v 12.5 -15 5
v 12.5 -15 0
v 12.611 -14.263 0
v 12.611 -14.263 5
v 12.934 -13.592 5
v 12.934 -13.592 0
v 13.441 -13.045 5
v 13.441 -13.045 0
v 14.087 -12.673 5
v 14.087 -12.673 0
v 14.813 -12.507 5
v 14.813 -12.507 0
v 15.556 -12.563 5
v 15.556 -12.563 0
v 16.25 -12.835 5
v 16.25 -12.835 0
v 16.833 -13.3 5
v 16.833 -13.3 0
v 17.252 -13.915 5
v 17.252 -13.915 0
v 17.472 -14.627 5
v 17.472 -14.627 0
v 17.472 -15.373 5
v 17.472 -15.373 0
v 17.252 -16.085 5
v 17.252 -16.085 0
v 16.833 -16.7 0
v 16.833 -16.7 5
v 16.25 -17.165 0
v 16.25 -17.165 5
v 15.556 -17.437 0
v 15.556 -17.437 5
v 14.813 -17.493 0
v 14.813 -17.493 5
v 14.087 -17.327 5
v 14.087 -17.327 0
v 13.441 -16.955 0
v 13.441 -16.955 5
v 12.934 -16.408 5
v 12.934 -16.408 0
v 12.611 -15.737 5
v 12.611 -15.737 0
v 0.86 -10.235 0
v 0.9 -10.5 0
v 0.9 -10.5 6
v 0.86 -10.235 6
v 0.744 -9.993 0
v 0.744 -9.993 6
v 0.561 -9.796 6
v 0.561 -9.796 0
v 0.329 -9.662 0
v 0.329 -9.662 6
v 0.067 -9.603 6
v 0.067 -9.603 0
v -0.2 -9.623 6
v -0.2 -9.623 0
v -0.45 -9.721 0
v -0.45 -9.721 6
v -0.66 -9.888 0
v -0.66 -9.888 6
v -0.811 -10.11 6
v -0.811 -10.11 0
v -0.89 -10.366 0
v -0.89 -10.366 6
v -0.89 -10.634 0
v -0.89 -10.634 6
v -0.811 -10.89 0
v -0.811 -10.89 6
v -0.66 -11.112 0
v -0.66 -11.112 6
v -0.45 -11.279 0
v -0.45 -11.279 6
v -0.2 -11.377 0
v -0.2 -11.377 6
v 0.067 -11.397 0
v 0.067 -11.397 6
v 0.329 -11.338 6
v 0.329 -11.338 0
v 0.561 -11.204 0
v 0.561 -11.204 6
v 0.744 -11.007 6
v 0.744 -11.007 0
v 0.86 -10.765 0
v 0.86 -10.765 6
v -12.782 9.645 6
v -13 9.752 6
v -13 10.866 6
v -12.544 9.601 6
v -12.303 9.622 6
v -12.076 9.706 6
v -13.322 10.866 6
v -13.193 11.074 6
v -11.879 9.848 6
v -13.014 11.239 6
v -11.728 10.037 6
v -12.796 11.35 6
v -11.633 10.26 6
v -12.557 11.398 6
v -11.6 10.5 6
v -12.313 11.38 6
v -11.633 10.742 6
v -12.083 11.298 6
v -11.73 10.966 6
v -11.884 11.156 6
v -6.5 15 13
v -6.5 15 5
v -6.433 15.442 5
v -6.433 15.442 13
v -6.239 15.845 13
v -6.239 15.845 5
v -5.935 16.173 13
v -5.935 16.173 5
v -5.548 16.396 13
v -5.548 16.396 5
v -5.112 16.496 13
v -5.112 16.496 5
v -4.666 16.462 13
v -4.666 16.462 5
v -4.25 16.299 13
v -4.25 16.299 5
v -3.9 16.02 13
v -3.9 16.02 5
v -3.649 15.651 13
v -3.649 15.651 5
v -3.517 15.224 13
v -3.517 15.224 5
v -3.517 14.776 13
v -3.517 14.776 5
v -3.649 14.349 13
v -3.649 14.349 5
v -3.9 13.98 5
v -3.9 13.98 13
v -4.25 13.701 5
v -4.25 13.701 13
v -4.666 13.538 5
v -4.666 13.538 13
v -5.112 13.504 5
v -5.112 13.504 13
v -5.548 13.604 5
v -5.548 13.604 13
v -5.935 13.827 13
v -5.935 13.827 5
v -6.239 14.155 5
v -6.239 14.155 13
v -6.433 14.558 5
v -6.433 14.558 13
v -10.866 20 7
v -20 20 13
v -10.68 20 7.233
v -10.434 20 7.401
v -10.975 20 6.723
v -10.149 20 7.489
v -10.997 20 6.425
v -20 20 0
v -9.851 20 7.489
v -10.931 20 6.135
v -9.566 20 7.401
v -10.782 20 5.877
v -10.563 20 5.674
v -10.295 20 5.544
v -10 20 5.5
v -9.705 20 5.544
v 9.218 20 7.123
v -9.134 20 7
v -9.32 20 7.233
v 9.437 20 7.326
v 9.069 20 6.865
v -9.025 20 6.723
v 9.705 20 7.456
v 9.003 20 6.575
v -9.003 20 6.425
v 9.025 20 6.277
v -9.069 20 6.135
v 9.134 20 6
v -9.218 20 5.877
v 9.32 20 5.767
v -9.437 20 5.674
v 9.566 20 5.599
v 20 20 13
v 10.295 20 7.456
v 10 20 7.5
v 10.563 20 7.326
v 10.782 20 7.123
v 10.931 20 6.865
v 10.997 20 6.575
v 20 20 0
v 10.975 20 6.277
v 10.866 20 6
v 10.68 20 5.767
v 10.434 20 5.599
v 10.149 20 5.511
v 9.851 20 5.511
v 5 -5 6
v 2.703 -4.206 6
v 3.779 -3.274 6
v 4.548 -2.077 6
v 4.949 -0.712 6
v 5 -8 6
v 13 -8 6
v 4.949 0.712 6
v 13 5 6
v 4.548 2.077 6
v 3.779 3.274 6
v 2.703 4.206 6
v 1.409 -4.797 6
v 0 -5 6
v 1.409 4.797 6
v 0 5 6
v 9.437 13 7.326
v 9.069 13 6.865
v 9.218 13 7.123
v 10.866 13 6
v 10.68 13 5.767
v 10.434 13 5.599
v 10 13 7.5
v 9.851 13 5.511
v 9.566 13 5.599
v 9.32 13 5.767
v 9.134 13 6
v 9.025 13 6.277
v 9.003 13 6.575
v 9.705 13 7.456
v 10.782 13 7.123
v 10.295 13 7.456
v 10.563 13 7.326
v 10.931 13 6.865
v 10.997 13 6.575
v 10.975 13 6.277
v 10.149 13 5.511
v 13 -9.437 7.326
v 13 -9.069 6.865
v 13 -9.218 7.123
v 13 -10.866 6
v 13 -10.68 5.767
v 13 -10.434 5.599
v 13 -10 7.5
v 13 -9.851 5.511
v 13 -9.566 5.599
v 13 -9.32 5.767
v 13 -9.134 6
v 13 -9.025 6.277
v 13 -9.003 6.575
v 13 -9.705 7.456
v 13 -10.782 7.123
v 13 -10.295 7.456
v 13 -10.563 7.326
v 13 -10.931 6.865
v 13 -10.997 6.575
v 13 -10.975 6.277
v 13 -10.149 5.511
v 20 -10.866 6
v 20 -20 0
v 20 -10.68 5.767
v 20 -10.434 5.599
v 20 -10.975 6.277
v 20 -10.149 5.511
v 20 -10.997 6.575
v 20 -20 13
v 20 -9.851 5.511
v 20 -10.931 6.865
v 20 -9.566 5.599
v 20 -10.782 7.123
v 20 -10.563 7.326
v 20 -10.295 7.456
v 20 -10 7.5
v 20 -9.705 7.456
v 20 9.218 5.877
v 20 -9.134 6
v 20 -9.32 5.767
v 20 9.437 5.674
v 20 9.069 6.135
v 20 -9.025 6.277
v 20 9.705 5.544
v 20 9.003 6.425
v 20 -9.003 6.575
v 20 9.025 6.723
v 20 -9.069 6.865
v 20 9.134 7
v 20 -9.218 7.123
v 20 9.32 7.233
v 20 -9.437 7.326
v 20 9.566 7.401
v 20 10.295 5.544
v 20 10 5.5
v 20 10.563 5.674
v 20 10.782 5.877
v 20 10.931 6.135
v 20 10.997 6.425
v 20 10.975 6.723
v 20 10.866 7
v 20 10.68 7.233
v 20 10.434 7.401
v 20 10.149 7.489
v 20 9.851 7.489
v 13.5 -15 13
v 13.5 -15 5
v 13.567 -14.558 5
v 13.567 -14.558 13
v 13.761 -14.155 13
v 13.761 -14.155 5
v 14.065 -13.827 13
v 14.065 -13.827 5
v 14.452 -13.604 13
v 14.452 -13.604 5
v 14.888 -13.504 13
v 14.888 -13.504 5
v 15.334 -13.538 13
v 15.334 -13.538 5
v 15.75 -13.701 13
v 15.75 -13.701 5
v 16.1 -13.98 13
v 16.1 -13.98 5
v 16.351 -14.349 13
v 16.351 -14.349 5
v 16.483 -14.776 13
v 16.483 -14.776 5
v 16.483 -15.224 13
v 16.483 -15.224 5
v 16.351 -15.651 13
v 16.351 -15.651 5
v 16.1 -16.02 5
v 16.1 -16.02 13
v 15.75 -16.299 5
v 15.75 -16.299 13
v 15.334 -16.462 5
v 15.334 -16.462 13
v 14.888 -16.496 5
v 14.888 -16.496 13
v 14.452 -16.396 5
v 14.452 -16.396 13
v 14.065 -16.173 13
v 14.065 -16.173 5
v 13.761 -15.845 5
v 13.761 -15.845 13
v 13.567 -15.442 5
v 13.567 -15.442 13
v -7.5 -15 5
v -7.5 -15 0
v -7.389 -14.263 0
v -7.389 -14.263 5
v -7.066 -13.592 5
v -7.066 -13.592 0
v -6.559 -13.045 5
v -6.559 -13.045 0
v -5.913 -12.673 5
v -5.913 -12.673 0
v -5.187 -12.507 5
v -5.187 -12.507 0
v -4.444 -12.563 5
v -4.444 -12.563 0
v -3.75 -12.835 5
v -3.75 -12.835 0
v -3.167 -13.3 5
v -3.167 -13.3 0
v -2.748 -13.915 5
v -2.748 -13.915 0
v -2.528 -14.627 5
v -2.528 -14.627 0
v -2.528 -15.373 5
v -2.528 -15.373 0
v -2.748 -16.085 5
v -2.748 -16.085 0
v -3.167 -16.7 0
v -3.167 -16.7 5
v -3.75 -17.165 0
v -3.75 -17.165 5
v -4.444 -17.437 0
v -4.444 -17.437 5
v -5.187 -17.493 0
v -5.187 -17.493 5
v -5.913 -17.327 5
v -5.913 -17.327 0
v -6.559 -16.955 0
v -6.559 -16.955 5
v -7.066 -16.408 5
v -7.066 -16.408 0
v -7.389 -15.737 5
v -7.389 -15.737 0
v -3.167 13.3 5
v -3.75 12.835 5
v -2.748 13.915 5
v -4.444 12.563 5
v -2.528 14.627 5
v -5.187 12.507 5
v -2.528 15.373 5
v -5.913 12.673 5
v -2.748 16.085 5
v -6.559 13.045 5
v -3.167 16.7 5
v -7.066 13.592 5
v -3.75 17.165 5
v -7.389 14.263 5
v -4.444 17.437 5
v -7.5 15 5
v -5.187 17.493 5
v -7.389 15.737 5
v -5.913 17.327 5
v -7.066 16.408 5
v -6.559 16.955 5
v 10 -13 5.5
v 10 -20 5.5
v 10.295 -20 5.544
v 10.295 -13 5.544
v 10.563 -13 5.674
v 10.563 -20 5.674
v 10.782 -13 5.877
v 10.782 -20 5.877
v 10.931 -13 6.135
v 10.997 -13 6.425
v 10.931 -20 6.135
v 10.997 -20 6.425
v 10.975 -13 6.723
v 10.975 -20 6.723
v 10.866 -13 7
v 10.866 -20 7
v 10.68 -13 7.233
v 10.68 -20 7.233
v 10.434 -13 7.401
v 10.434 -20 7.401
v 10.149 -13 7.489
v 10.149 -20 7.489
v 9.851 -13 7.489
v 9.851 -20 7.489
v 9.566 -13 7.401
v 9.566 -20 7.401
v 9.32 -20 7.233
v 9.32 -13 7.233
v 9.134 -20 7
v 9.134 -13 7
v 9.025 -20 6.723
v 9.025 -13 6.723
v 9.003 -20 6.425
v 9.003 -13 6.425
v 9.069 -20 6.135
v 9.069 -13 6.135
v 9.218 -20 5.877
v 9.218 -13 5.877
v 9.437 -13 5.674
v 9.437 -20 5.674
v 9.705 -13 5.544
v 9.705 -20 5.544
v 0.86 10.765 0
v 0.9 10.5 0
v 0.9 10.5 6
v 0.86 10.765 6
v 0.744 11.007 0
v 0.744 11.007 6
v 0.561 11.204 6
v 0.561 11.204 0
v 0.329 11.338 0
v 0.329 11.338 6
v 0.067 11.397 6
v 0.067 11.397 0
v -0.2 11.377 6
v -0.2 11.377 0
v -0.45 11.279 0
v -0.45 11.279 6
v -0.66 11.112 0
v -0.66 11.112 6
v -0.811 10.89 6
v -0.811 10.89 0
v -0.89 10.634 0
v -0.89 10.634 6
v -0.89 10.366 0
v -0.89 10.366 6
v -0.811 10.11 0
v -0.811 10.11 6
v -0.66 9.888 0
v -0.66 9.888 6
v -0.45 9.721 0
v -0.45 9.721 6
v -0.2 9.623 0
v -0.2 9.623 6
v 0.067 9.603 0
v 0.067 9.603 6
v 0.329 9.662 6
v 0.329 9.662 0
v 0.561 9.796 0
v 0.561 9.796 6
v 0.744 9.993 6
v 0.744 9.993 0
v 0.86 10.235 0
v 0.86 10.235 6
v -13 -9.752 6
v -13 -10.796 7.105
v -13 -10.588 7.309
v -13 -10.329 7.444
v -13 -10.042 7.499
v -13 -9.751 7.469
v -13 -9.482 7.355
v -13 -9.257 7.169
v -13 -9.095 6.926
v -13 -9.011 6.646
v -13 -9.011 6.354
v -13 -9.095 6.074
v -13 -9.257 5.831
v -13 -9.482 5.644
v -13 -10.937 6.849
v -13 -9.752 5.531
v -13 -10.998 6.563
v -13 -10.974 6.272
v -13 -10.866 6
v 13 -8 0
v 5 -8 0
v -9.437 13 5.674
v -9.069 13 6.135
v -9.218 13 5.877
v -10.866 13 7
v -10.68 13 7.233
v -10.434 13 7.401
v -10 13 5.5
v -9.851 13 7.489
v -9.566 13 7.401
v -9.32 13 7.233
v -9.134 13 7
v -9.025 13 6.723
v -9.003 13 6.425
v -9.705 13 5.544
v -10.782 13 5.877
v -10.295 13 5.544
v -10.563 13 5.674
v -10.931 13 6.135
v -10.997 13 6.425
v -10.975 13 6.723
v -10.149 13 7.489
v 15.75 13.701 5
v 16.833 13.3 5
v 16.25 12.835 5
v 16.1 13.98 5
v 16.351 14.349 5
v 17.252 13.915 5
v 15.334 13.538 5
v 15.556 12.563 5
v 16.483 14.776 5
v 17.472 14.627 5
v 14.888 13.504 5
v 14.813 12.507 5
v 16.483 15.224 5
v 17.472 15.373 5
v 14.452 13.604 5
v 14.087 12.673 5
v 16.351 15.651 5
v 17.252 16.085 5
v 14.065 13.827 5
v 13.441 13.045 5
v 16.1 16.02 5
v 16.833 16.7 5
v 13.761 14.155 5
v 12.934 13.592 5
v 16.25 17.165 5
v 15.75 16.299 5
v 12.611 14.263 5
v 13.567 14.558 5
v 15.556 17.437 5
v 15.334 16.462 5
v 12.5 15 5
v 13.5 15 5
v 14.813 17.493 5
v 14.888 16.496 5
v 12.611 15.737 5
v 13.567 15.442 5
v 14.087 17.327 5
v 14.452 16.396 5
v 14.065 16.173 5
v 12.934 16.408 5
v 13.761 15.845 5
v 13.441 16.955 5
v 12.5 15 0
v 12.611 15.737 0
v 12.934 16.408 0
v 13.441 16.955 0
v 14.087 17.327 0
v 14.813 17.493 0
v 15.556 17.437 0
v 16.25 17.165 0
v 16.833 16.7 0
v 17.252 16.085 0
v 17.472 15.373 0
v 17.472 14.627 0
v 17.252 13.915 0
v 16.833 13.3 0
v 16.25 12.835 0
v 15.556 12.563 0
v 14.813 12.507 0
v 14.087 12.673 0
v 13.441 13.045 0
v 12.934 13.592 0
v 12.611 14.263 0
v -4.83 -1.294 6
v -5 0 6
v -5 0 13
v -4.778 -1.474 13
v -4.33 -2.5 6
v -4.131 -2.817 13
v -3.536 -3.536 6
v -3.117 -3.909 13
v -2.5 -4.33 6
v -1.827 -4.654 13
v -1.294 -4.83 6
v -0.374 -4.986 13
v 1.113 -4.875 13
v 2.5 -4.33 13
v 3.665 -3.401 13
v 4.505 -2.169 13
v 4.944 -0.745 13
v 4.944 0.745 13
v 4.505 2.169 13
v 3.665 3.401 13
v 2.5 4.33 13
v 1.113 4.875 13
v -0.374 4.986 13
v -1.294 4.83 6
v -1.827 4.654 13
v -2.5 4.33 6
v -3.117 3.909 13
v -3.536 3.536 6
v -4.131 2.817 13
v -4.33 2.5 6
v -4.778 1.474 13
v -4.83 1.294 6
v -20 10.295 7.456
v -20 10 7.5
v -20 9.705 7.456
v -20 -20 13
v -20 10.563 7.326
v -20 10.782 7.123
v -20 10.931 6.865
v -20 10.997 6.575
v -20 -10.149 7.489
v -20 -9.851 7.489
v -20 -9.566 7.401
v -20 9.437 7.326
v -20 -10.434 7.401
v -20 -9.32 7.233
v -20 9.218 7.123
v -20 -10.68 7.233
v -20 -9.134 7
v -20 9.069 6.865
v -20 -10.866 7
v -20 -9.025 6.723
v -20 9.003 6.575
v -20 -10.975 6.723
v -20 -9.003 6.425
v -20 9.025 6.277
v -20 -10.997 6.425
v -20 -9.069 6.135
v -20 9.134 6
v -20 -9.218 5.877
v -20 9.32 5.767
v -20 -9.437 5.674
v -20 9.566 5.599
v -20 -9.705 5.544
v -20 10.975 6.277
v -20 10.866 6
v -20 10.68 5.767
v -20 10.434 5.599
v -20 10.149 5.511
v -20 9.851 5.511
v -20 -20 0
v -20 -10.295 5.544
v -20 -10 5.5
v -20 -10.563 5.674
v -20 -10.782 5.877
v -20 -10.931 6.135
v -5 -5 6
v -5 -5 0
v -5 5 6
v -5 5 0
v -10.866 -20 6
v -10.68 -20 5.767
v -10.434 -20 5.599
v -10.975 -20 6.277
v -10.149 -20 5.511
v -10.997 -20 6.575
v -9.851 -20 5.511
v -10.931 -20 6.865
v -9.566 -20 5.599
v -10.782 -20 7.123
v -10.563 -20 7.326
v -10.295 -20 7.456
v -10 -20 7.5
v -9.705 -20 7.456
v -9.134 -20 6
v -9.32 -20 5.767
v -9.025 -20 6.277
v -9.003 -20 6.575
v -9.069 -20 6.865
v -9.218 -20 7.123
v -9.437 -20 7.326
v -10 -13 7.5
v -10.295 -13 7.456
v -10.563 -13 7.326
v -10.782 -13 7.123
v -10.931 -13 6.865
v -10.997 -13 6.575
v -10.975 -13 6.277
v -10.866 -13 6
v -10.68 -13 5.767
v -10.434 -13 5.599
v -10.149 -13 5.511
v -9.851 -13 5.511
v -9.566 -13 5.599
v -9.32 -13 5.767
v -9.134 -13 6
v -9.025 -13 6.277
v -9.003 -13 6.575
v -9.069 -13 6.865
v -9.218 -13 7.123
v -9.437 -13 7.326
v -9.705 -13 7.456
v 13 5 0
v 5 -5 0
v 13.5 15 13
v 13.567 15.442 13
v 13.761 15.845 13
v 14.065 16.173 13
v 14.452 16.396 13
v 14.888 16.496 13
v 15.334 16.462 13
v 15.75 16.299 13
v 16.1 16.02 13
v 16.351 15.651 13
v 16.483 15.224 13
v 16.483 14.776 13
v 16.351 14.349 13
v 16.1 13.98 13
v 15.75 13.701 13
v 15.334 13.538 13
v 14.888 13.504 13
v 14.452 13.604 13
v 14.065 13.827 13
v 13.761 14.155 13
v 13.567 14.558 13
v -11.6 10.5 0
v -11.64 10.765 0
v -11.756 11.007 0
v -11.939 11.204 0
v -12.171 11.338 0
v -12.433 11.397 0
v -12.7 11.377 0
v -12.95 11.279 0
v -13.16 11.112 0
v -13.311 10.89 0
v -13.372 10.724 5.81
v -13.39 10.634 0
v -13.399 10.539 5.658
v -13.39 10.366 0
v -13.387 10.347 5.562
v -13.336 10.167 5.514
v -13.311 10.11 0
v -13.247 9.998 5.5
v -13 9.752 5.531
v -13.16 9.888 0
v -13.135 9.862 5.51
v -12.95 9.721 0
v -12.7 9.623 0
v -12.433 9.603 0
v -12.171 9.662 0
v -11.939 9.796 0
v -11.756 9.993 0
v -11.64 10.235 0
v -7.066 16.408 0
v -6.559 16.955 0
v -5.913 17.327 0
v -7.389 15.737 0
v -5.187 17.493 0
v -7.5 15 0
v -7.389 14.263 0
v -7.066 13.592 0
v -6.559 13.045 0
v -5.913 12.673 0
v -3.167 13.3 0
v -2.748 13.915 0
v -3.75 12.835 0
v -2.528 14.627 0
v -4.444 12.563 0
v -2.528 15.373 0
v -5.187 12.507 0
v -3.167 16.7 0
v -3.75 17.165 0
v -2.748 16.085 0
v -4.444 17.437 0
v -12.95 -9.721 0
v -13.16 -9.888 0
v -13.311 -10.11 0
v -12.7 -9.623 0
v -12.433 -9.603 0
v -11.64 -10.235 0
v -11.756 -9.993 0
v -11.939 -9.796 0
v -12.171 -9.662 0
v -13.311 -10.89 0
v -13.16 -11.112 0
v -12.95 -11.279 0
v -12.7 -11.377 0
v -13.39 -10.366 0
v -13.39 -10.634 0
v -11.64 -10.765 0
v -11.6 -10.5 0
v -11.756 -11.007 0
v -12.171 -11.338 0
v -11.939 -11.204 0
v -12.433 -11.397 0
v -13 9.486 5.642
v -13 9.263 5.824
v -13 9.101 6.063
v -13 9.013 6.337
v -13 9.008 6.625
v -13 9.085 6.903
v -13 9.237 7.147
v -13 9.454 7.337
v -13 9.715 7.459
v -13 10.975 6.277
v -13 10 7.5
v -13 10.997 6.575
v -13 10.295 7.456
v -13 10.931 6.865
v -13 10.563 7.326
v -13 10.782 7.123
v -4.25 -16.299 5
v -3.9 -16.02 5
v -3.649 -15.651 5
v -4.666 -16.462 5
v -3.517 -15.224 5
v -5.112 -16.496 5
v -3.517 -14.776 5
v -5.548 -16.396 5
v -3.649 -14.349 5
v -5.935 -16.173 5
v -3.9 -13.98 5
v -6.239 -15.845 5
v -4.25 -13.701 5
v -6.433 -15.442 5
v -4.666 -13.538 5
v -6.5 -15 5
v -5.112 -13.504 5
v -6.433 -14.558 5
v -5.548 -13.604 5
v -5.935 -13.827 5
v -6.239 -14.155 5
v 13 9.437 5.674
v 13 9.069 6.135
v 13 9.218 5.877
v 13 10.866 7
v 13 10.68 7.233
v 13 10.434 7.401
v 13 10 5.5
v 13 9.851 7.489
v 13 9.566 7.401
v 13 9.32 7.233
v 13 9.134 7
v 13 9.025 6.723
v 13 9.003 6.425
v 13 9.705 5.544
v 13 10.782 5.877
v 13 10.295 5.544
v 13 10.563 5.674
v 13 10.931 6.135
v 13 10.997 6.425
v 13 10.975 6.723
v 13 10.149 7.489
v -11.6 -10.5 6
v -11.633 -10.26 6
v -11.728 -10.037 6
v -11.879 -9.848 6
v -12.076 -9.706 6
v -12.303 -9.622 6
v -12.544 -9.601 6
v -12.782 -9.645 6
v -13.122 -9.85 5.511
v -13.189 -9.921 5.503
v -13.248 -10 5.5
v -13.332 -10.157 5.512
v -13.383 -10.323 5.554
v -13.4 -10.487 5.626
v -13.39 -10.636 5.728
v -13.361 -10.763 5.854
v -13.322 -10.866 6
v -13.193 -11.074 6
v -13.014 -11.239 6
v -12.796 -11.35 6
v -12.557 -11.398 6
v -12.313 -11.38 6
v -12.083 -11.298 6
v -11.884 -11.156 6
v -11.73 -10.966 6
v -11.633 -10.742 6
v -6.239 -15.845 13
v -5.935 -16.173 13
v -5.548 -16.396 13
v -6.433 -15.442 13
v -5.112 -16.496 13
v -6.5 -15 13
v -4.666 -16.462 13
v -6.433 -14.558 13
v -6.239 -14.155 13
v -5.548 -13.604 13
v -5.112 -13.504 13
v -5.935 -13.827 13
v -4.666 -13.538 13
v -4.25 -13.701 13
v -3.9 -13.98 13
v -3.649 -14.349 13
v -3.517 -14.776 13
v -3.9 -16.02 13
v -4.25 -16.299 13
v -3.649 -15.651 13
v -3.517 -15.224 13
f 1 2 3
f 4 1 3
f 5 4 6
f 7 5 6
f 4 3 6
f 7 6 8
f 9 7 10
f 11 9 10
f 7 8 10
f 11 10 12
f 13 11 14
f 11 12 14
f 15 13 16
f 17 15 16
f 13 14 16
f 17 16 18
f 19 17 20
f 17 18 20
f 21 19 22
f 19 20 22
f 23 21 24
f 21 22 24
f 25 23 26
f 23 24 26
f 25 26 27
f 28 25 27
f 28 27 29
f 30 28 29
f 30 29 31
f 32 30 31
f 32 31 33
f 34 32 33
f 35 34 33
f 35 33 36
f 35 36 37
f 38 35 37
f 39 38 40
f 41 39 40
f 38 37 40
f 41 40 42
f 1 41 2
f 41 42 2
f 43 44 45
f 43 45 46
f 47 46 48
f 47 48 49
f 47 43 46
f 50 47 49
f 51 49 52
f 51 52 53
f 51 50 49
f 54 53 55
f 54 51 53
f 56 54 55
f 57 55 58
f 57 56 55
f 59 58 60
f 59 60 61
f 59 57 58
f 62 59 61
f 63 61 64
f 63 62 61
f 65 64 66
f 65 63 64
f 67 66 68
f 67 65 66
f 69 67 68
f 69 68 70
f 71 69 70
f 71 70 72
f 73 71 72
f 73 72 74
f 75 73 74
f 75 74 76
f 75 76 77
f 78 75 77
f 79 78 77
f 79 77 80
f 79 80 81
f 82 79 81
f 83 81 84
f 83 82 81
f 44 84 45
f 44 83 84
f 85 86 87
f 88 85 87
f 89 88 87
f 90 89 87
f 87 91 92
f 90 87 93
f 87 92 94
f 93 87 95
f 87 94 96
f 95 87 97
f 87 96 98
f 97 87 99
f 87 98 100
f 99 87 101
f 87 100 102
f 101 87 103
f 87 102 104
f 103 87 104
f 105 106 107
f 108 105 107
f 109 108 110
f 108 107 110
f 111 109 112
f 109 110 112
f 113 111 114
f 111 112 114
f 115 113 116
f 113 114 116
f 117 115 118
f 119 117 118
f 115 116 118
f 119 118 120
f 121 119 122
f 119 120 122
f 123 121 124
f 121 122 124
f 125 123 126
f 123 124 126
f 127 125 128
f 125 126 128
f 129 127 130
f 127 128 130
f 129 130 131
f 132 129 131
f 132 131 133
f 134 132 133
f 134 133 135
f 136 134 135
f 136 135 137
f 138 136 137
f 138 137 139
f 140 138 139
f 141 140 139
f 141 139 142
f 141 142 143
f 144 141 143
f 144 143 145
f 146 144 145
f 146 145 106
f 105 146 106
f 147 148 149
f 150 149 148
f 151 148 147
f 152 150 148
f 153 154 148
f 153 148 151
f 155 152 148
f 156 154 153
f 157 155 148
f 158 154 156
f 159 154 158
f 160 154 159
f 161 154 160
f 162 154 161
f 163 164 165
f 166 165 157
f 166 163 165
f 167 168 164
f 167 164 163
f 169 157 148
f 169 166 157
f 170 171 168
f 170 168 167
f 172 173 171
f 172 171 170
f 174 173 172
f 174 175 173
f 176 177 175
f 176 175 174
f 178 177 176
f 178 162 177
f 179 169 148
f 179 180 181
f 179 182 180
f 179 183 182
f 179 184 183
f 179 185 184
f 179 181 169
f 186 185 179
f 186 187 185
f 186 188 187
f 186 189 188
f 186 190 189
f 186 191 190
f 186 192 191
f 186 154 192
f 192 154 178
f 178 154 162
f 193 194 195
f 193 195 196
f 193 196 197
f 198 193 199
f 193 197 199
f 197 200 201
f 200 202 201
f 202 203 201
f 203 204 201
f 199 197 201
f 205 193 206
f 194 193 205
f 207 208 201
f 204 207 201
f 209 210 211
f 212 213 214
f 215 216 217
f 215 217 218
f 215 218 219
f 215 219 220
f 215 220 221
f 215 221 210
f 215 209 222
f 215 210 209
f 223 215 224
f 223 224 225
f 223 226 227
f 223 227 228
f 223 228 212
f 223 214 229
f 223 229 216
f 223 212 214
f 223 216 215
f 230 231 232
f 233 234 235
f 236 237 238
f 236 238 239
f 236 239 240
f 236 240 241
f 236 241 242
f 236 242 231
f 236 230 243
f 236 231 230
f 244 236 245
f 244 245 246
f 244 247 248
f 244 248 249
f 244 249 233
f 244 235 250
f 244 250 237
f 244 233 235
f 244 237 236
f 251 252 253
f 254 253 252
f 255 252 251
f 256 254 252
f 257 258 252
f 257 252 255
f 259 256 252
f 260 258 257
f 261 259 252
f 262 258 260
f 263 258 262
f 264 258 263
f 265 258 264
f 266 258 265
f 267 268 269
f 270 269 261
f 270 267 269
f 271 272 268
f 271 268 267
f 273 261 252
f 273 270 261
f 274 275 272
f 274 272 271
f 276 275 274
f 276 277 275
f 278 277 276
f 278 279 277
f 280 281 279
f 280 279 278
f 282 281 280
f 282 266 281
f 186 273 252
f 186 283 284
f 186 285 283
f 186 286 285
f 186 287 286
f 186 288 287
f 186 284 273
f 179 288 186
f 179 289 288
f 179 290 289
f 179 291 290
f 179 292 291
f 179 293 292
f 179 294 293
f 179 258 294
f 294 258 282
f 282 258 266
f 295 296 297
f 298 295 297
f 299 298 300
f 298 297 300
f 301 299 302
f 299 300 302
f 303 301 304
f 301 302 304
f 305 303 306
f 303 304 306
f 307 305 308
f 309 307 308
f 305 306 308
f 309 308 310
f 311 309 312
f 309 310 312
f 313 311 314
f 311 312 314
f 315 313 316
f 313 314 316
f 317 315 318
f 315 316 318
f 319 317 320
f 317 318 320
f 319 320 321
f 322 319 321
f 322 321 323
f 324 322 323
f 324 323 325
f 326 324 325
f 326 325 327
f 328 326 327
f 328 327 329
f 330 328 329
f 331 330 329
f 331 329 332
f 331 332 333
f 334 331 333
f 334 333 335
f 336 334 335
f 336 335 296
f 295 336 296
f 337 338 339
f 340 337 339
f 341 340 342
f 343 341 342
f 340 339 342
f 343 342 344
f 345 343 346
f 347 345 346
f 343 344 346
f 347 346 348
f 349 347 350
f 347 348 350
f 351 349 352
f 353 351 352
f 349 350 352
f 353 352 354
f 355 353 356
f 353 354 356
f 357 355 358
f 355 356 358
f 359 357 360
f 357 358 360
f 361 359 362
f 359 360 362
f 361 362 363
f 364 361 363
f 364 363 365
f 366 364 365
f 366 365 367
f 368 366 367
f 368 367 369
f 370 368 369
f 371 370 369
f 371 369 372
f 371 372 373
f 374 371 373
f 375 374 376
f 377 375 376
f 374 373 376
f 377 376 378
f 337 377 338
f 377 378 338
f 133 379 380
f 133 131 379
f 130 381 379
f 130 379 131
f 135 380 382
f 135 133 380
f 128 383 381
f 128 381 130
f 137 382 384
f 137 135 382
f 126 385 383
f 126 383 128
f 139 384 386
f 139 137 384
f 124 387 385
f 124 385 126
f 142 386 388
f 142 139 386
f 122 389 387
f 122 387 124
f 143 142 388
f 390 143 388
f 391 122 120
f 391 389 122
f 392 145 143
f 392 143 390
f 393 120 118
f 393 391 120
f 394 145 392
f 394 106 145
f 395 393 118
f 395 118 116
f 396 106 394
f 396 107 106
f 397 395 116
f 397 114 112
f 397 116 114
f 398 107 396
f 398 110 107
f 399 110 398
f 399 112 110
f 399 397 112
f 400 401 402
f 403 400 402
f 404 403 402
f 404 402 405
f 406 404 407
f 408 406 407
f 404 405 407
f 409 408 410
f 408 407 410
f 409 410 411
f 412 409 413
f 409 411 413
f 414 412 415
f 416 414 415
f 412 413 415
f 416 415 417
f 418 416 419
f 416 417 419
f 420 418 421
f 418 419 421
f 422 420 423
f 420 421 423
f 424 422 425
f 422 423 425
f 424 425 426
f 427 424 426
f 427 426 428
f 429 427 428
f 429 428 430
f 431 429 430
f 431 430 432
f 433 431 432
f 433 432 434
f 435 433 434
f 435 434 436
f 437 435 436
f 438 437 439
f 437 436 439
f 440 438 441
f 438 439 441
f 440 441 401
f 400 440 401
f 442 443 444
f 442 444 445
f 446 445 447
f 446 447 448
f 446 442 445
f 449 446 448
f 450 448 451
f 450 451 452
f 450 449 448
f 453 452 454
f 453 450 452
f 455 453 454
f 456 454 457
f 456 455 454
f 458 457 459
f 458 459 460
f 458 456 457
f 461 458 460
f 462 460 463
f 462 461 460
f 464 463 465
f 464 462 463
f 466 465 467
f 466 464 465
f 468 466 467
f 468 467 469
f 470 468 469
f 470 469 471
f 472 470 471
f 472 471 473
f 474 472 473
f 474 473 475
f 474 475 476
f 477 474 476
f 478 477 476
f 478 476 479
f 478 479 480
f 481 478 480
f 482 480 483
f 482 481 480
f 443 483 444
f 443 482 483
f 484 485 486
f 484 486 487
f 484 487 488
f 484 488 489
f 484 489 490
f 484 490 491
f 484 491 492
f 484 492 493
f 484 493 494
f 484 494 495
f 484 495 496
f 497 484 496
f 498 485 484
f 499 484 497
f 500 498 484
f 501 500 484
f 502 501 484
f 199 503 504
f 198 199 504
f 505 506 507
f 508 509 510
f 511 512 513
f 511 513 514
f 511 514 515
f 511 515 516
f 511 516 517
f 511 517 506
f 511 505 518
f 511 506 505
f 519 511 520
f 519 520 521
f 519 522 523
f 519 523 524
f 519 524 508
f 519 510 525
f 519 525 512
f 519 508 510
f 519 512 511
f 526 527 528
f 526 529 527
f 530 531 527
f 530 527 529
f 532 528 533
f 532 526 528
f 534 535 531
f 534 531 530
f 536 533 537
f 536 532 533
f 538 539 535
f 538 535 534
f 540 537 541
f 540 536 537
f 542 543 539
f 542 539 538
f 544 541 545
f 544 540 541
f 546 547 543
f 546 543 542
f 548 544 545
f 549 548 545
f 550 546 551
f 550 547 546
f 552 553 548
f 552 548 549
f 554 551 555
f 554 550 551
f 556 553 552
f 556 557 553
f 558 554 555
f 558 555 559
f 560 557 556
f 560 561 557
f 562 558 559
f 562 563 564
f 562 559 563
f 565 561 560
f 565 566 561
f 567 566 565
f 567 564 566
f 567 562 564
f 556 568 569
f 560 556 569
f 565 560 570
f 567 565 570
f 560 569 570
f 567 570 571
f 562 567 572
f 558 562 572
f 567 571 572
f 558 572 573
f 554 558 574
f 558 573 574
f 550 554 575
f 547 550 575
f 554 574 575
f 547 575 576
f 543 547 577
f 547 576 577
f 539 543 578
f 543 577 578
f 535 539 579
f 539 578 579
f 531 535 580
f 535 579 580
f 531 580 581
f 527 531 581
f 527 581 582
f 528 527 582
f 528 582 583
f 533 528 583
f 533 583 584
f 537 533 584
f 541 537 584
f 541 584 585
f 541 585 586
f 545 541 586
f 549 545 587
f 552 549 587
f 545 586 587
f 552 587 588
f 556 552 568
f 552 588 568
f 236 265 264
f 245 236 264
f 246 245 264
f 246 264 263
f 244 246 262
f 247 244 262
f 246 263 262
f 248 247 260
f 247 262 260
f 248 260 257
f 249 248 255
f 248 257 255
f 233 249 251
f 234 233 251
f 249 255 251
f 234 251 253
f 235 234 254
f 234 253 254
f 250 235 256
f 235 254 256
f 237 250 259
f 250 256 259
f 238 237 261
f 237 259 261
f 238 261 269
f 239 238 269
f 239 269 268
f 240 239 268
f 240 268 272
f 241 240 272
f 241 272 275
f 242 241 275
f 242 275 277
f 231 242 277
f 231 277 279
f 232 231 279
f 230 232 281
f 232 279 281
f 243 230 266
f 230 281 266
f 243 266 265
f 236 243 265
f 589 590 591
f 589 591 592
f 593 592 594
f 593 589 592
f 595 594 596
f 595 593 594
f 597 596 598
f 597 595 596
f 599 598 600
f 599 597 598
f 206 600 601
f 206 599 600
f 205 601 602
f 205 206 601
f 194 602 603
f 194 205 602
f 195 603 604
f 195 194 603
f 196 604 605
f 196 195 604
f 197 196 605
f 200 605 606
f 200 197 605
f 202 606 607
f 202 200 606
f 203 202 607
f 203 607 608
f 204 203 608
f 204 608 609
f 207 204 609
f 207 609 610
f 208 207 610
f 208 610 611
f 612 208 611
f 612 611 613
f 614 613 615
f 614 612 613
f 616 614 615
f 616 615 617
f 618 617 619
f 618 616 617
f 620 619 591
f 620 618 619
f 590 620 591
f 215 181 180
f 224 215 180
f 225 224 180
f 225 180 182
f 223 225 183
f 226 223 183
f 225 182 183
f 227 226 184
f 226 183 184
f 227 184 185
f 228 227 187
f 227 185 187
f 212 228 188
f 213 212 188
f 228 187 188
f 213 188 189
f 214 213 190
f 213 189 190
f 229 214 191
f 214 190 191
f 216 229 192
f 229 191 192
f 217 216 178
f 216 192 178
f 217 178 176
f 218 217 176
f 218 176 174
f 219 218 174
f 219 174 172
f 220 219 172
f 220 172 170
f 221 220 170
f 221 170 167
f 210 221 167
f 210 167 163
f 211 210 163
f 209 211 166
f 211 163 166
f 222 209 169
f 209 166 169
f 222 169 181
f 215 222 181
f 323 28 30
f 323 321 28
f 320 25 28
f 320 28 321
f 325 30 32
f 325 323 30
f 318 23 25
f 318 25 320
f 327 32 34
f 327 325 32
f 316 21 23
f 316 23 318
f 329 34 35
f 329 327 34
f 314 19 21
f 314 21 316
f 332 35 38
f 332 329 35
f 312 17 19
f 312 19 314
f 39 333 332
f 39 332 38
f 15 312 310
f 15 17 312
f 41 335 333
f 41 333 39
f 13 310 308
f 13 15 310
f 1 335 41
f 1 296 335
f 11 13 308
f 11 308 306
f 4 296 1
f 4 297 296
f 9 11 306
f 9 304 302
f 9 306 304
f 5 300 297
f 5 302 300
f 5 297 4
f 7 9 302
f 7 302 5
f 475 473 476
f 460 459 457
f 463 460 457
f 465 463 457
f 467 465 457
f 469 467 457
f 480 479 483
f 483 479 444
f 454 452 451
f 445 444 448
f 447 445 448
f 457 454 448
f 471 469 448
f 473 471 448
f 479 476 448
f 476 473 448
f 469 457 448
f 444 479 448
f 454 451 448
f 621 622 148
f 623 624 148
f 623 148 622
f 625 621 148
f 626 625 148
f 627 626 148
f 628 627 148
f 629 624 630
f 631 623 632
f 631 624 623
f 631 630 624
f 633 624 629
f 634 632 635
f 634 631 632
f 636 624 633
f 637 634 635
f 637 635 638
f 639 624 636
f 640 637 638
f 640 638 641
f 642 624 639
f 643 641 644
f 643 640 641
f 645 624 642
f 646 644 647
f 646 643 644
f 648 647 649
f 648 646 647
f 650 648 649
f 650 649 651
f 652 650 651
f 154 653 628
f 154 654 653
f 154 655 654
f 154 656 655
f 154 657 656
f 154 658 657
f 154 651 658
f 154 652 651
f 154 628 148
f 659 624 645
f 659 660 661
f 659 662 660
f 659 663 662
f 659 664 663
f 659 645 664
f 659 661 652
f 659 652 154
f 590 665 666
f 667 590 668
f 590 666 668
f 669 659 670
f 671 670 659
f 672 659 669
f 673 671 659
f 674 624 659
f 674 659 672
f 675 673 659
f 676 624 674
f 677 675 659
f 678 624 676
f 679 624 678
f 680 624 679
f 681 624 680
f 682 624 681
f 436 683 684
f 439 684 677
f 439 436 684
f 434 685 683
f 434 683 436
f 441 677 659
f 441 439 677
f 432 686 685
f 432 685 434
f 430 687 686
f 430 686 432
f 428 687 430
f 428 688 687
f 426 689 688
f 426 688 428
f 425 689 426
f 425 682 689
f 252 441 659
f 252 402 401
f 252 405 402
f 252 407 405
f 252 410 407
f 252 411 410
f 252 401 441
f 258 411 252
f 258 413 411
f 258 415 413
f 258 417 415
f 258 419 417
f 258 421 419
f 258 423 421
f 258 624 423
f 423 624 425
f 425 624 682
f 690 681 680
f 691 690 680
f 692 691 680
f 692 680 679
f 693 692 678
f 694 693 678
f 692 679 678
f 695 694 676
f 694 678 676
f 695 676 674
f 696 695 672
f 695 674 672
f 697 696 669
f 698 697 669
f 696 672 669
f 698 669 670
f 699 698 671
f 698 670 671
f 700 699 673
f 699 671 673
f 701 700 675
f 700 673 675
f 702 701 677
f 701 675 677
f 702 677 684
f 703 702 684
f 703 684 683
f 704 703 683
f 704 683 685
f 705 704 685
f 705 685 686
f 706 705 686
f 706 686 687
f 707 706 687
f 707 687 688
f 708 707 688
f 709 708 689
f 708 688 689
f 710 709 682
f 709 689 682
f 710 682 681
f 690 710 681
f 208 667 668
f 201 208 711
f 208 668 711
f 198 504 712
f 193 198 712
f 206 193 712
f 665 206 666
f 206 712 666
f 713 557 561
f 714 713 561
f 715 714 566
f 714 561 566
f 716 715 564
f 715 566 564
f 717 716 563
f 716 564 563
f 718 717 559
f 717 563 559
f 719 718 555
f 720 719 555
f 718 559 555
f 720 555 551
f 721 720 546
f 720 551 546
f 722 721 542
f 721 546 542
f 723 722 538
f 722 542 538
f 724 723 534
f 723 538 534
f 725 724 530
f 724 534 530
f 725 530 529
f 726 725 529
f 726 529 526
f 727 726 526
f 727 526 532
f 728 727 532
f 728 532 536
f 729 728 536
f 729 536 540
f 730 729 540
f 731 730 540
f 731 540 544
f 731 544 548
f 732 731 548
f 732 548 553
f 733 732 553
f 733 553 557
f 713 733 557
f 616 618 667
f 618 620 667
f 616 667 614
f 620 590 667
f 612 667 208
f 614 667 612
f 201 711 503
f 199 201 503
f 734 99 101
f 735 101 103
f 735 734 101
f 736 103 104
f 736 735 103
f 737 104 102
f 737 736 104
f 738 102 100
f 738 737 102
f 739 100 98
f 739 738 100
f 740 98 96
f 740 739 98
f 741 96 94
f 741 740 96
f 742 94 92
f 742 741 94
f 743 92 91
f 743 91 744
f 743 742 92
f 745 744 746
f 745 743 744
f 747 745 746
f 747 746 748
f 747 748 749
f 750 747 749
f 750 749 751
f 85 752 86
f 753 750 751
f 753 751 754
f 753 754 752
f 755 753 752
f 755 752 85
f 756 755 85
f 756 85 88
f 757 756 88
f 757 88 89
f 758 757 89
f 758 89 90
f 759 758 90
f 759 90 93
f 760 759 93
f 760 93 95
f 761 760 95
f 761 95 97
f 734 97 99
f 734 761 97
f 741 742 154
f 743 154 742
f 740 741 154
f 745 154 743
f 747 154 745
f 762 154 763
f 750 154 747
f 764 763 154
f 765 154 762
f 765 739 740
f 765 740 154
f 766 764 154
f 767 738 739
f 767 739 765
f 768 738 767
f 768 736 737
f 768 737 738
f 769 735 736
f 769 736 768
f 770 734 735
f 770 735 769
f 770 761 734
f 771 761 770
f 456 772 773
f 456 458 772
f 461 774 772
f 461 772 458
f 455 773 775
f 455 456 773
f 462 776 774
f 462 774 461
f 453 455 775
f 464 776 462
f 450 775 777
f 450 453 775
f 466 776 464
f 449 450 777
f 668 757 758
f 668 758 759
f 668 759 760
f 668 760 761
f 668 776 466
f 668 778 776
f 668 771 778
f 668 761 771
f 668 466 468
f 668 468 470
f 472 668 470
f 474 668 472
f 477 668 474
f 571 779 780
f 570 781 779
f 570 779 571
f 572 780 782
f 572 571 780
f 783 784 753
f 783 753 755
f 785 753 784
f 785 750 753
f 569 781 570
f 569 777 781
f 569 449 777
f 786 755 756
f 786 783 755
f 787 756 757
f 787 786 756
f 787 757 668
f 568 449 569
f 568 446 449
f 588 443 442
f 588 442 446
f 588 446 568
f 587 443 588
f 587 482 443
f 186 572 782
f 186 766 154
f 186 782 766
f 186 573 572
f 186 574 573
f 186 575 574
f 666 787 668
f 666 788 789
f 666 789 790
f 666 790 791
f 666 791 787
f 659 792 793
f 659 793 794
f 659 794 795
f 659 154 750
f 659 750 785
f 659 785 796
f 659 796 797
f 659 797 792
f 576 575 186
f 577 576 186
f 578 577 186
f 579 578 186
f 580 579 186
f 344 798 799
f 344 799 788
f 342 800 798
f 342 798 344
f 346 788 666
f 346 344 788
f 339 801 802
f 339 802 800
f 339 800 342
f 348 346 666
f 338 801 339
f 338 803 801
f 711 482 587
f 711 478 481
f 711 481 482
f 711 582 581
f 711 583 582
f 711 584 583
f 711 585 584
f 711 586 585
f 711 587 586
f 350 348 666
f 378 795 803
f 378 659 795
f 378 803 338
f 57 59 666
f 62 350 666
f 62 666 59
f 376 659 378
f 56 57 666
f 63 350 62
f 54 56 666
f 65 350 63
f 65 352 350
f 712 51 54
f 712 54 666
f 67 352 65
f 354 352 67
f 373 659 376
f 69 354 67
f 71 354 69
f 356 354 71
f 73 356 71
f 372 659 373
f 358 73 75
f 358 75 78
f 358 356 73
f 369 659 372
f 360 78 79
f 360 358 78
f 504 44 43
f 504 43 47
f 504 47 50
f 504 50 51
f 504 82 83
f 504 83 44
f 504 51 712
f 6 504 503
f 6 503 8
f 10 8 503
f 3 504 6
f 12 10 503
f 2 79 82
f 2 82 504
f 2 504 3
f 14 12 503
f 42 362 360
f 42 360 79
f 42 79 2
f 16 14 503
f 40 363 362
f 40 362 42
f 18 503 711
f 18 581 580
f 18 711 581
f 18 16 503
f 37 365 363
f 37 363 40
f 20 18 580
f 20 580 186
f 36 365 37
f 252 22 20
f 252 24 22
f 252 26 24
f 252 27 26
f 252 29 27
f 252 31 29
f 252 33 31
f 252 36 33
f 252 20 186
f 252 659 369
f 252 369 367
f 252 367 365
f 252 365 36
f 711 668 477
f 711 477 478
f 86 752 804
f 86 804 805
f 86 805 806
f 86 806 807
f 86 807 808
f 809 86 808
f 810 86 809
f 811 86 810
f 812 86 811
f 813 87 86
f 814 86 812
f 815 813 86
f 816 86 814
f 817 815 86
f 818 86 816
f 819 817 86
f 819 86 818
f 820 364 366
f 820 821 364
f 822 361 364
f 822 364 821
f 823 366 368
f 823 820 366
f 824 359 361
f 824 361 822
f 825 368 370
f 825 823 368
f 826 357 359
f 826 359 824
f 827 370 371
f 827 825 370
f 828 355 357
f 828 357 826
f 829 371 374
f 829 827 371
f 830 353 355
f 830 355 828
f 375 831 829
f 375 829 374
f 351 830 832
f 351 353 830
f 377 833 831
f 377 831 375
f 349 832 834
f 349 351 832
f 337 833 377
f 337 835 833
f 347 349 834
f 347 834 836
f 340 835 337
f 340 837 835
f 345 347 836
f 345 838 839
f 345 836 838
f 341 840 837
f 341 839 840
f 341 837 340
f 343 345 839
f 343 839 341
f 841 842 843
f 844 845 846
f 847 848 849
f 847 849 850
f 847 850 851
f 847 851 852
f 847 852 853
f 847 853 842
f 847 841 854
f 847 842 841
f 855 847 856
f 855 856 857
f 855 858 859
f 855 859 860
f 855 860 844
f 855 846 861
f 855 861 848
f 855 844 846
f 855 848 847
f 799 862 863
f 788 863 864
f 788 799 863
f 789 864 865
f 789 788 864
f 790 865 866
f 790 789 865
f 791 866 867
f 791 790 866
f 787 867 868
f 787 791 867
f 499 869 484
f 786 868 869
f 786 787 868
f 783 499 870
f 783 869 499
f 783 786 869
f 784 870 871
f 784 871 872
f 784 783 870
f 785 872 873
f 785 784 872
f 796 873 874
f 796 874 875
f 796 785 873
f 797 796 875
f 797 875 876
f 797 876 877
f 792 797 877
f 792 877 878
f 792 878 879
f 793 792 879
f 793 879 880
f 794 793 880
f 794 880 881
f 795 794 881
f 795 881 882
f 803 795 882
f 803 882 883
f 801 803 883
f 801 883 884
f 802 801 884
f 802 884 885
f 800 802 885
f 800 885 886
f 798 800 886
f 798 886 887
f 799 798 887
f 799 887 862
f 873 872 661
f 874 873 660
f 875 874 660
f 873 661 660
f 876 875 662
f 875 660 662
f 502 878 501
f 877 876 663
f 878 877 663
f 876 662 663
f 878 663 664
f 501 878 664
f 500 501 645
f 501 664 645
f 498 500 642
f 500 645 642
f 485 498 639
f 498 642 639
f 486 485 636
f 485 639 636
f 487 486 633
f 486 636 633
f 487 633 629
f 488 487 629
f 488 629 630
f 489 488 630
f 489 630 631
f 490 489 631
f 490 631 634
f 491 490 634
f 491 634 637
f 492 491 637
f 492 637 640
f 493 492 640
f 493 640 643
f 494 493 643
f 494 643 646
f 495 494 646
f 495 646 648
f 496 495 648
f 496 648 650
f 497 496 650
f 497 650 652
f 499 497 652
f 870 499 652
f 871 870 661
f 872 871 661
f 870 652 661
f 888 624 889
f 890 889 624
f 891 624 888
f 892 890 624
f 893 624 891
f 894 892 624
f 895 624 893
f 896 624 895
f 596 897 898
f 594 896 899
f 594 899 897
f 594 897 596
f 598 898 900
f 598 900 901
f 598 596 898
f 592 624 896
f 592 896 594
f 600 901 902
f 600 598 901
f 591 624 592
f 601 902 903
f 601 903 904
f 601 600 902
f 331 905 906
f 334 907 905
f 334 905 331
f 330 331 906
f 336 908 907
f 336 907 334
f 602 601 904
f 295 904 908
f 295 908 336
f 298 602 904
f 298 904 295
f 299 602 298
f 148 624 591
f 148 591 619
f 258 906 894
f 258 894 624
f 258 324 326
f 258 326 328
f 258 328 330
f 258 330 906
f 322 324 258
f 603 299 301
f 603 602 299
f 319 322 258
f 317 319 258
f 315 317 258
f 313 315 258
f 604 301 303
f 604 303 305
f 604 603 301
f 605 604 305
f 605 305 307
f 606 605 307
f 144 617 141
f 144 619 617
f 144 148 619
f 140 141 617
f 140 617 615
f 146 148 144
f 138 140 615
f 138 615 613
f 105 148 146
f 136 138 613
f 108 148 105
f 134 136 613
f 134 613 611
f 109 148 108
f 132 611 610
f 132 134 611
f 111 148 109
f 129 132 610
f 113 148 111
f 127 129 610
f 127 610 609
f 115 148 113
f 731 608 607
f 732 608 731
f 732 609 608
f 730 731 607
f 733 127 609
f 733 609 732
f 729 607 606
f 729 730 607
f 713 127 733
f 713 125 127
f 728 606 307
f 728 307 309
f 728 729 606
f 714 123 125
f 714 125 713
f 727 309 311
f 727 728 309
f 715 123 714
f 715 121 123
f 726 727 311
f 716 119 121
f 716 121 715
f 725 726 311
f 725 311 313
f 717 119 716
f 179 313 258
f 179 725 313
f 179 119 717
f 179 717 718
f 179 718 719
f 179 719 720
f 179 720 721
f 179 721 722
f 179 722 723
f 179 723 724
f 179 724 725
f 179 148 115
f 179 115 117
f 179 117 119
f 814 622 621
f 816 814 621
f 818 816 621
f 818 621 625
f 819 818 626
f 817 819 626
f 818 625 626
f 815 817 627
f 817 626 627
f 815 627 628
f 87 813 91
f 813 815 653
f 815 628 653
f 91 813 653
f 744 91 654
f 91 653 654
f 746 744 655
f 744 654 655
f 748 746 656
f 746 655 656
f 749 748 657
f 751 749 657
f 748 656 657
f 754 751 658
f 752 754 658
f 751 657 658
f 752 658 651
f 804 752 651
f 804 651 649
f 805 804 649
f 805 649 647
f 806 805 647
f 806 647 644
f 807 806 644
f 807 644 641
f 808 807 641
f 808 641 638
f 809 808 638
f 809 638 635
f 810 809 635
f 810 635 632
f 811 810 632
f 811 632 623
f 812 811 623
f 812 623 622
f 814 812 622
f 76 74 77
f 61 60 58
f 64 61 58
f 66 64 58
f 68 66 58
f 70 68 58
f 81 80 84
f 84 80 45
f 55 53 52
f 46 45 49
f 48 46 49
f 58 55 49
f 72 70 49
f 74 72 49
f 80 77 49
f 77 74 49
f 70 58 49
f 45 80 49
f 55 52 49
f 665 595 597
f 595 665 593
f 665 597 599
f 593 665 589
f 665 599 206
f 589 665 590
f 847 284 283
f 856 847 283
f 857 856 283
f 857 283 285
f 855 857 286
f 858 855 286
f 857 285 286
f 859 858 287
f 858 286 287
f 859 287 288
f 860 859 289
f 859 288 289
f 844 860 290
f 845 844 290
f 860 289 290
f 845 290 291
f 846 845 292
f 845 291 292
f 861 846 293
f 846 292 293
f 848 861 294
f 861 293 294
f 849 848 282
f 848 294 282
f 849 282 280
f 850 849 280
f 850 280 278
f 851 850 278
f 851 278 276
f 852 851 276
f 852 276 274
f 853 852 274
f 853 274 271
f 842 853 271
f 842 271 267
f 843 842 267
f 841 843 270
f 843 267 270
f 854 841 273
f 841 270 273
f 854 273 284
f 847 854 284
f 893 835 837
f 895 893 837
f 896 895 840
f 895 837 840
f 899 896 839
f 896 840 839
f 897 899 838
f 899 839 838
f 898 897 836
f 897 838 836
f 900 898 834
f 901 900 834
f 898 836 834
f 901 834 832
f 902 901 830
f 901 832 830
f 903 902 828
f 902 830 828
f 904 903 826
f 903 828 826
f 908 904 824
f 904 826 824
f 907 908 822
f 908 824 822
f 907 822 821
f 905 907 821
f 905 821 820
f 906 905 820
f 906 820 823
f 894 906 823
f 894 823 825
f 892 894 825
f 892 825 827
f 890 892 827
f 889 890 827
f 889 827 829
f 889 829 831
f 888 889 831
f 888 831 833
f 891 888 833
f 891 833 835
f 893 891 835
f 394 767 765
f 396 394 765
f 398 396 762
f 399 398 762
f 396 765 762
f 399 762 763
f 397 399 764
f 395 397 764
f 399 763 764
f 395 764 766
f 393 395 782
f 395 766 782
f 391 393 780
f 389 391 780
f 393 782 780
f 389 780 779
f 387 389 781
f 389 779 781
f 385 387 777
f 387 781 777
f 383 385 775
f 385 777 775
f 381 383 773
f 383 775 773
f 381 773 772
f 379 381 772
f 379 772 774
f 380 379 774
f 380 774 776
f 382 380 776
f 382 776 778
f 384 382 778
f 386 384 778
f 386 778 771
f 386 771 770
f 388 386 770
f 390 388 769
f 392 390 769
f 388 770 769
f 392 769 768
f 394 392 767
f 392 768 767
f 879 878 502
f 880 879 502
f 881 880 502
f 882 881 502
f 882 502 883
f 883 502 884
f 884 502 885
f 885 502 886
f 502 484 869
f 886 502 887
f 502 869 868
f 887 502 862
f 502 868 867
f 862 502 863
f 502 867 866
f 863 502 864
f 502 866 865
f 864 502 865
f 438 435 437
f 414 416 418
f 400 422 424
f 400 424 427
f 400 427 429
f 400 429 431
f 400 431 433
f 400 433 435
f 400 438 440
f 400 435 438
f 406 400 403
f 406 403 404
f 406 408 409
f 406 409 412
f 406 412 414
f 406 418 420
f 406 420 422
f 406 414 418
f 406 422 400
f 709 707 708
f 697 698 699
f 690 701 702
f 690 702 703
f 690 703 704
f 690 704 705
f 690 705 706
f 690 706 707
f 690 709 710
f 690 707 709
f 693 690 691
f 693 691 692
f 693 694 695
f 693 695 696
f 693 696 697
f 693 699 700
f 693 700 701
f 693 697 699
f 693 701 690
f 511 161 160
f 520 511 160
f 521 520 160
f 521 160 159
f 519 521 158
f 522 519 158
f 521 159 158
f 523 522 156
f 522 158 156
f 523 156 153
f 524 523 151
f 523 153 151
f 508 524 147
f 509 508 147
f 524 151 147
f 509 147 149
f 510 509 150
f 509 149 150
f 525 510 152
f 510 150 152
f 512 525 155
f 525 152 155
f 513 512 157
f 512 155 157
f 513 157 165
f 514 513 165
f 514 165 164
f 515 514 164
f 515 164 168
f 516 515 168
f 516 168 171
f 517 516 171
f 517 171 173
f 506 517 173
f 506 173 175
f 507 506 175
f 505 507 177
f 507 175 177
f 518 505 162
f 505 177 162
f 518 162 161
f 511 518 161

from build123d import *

# Parameters (mm, degrees)
SKETCH1_W            = 40
SKETCH1_H            = 40
SKETCH1_R            = 0.9
BOSS_EXTRUDE1_DEPTH  = 6
SKETCH11_W           = 40
SKETCH11_H           = 40
SKETCH11_R           = 5
BOSS_EXTRUDE6_DEPTH  = 7
SKETCH13_R           = 1.5
SKETCH13_R_2         = 1.395390764
CUT_EXTRUDE5_DEPTH   = 27
SKETCH13_3_R         = 3
SKETCH13_3_R_2       = 1.5
CUT_EXTRUDE6_DEPTH   = 3
SKETCH15_R           = 2.5
CUT_EXTRUDE9_DEPTH   = 5
CIRPATTERN4_COUNT    = 4
SKETCH16_R           = 3
BOSS_EXTRUDE7_DEPTH  = 13
SKETCH17_R           = 2.5
BOSS_EXTRUDE8_DEPTH  = 5
SKETCH18_R           = 2.5
BOSS_EXTRUDE9_DEPTH  = 5
SKETCH19_R           = 2.5
BOSS_EXTRUDE10_DEPTH = 5
SKETCH20_R           = 2.5
BOSS_EXTRUDE11_DEPTH = 5
SKETCH21_R           = 1.5
CUT_EXTRUDE10_DEPTH  = 25
SKETCH21_3_R         = 2.5
SKETCH21_3_R_2       = 1.5
CUT_EXTRUDE11_DEPTH  = 5
SKETCH22_R           = 1
CUT_EXTRUDE12_DEPTH  = 7
CIRPATTERN5_COUNT    = 4


with BuildPart() as part:
    # Sketch1 → Boss-Extrude1 (new body)
    with BuildSketch(Plane(origin=(0, 0, 0), x_dir=(0, 1, 0), z_dir=(0, 0, 1))):
        Rectangle(SKETCH1_W, SKETCH1_H)
        with Locations(Location((10.5, 0, 0), (0, 0, 270))):
            Circle(SKETCH1_R, mode=Mode.SUBTRACT)
        with Locations(Location((-10.5, 12.5, 0), (0, 0, 270))):
            Circle(SKETCH1_R, mode=Mode.SUBTRACT)
        with Locations(Location((-10.5, 0, 0), (0, 0, 270))):
            Circle(SKETCH1_R, mode=Mode.SUBTRACT)
        with Locations(Location((10.5, 12.5, 0), (0, 0, 270))):
            Circle(SKETCH1_R, mode=Mode.SUBTRACT)
        Polygon((-5, -13), (-8, -13), (-8, -5), (-5, -5), (-5, 5), (5, 5), (5, -5), (5, -13), align=None, mode=Mode.SUBTRACT)
    extrude(amount=BOSS_EXTRUDE1_DEPTH)

    # Sketch11 → Boss-Extrude6 (add)
    with BuildSketch(Plane.XY.offset(6)):
        Rectangle(SKETCH11_W, SKETCH11_H)
        with Locations(Location((0, 0, 0), (0, 0, 180))):
            Circle(SKETCH11_R, mode=Mode.SUBTRACT)
    extrude(amount=BOSS_EXTRUDE6_DEPTH)

    # Sketch13 → Cut-Extrude5 (cut)
    with BuildSketch(Plane(origin=(0, 0, 0), x_dir=(1, 0, 0), z_dir=(0, 0, -1))):
        with Locations(Location((-6.25, 13.75, 0), (0, 0, 180))):
            Circle(SKETCH13_R)
        with Locations(Location((6.25, 13.75, 0), (0, 0, 180))):
            Circle(SKETCH13_R)
        with Locations(Location((6.25, -13.75, 0), (0, 0, 180))):
            Circle(SKETCH13_R_2)
        with Locations(Location((-6.25, -13.75, 0), (0, 0, 180))):
            Circle(SKETCH13_R)
    extrude(amount=-CUT_EXTRUDE5_DEPTH, mode=Mode.SUBTRACT)

    # Sketch13<3> → Cut-Extrude6 (cut)
    # profile 1 of 4: a face of its own
    with BuildSketch(Plane(origin=(0, 0, 0), x_dir=(1, 0, 0), z_dir=(0, 0, -1))):
        with Locations(Location((-6.25, -13.75, 0), (0, 0, 180))):
            Circle(SKETCH13_3_R)
        with Locations(Location((-6.25, -13.75, 0), (0, 0, 180))):
            Circle(SKETCH13_3_R_2, mode=Mode.SUBTRACT)
    # profile 2 of 4: a face of its own
    with BuildSketch(Plane(origin=(0, 0, 0), x_dir=(1, 0, 0), z_dir=(0, 0, -1))):
        with Locations(Location((6.25, 13.75, 0), (0, 0, 180))):
            Circle(SKETCH13_3_R)
        with Locations(Location((6.25, 13.75, 0), (0, 0, 180))):
            Circle(SKETCH13_3_R_2, mode=Mode.SUBTRACT)
    # profile 3 of 4: a face of its own
    with BuildSketch(Plane(origin=(0, 0, 0), x_dir=(1, 0, 0), z_dir=(0, 0, -1))):
        with Locations(Location((-6.25, 13.75, 0), (0, 0, 180))):
            Circle(SKETCH13_3_R)
        with Locations(Location((-6.25, 13.75, 0), (0, 0, 180))):
            Circle(SKETCH13_3_R_2, mode=Mode.SUBTRACT)
    # profile 4 of 4: a face of its own
    with BuildSketch(Plane(origin=(0, 0, 0), x_dir=(1, 0, 0), z_dir=(0, 0, -1))):
        with Locations(Location((6.25, -13.75, 0), (0, 0, 180))):
            Circle(SKETCH13_3_R)
    extrude(amount=-CUT_EXTRUDE6_DEPTH, mode=Mode.SUBTRACT)

    # Sketch15 → Cut-Extrude9 (cut)
    with BuildSketch(Plane(origin=(0, 20, 0), x_dir=(-1, 0, 0), z_dir=(0, 1, 0))):
        with Locations(Location((-13.5, 6.5, 0), (0, 0, 90))):
            Circle(SKETCH15_R)
        with Locations(Location((13.5, 6.5, 0), (0, 0, 270))):
            Circle(SKETCH15_R)
    cut_extrude9 = extrude(amount=-CUT_EXTRUDE9_DEPTH, mode=Mode.SUBTRACT)

    # CirPattern4: Cut-Extrude9 ×4 about axis
    cirpattern4_axis = Axis((0, 0, 0), (0, 0, 1))
    for i in range(1, CIRPATTERN4_COUNT):
        add(cut_extrude9.rotate(cirpattern4_axis, i * 360 / CIRPATTERN4_COUNT), mode=Mode.SUBTRACT)

    # Sketch16 → Boss-Extrude7 (add)
    with BuildSketch(Plane(origin=(0, 0, 0), x_dir=(1, 0, 0), z_dir=(0, 0, -1))):
        with Locations((-6.25, 13.75)):
            Circle(SKETCH16_R)
        with Locations((6.25, 13.75)):
            Circle(SKETCH16_R)
        with Locations((-6.25, -13.75)):
            Circle(SKETCH16_R)
        with Locations((6.25, -13.75)):
            Circle(SKETCH16_R)
    extrude(amount=-BOSS_EXTRUDE7_DEPTH)

    # Sketch17 → Boss-Extrude8 (add)
    with BuildSketch(Plane(origin=(0, 20, 0), x_dir=(-1, 0, 0), z_dir=(0, 1, 0))):
        with Locations(Location((-13.5, 6.5, 0), (0, 0, 270))):
            Circle(SKETCH17_R)
        with Locations(Location((13.5, 6.5, 0), (0, 0, 306.869897646))):
            Circle(SKETCH17_R)
    extrude(amount=-BOSS_EXTRUDE8_DEPTH)

    # Sketch18 → Boss-Extrude9 (add)
    with BuildSketch(Plane(origin=(-20, 0, 0), x_dir=(0, -1, 0), z_dir=(-1, 0, 0))):
        with Locations(Location((-13.5, 6.5, 0), (0, 0, 233.130102354))):
            Circle(SKETCH18_R)
        with Locations(Location((13.5, 6.5, 0), (0, 0, 90))):
            Circle(SKETCH18_R)
    extrude(amount=-BOSS_EXTRUDE9_DEPTH)

    # Sketch19 → Boss-Extrude10 (add)
    with BuildSketch(Plane.XZ.offset(20)):
        with Locations((-13.5, 6.5)):
            Circle(SKETCH19_R)
        with Locations((13.5, 6.5)):
            Circle(SKETCH19_R)
    extrude(amount=-BOSS_EXTRUDE10_DEPTH)

    # Sketch20 → Boss-Extrude11 (add)
    with BuildSketch(Plane.YZ.offset(20)):
        with Locations((-13.5, 6.5)):
            Circle(SKETCH20_R)
        with Locations((13.5, 6.5)):
            Circle(SKETCH20_R)
    extrude(amount=-BOSS_EXTRUDE11_DEPTH)

    # Sketch21 → Cut-Extrude10 (cut)
    with BuildSketch(Plane(origin=(0, 0, 0), x_dir=(1, 0, 0), z_dir=(0, 0, -1))):
        with Locations(Location((-5, 15, 0), (0, 0, 180))):
            Circle(SKETCH21_R)
        with Locations(Location((15, 15, 0), (0, 0, 180))):
            Circle(SKETCH21_R)
        with Locations(Location((15, -15, 0), (0, 0, 180))):
            Circle(SKETCH21_R)
        with Locations(Location((-5, -15, 0), (0, 0, 180))):
            Circle(SKETCH21_R)
    extrude(amount=-CUT_EXTRUDE10_DEPTH, mode=Mode.SUBTRACT)

    # Sketch21<3> → Cut-Extrude11 (cut)
    # profile 1 of 4: a face of its own
    with BuildSketch(Plane(origin=(0, 0, 0), x_dir=(1, 0, 0), z_dir=(0, 0, -1))):
        with Locations(Location((-5, 15, 0), (0, 0, 180))):
            Circle(SKETCH21_3_R)
        with Locations(Location((-5, 15, 0), (0, 0, 180))):
            Circle(SKETCH21_3_R_2, mode=Mode.SUBTRACT)
    # profile 2 of 4: a face of its own
    with BuildSketch(Plane(origin=(0, 0, 0), x_dir=(1, 0, 0), z_dir=(0, 0, -1))):
        with Locations(Location((15, 15, 0), (0, 0, 180))):
            Circle(SKETCH21_3_R)
        with Locations(Location((15, 15, 0), (0, 0, 180))):
            Circle(SKETCH21_3_R_2, mode=Mode.SUBTRACT)
    # profile 3 of 4: a face of its own
    with BuildSketch(Plane(origin=(0, 0, 0), x_dir=(1, 0, 0), z_dir=(0, 0, -1))):
        with Locations(Location((15, -15, 0), (0, 0, 180))):
            Circle(SKETCH21_3_R)
        with Locations(Location((15, -15, 0), (0, 0, 180))):
            Circle(SKETCH21_3_R_2, mode=Mode.SUBTRACT)
    # profile 4 of 4: a face of its own
    with BuildSketch(Plane(origin=(0, 0, 0), x_dir=(1, 0, 0), z_dir=(0, 0, -1))):
        with Locations(Location((-5, -15, 0), (0, 0, 180))):
            Circle(SKETCH21_3_R)
        with Locations(Location((-5, -15, 0), (0, 0, 180))):
            Circle(SKETCH21_3_R_2, mode=Mode.SUBTRACT)
    extrude(amount=-CUT_EXTRUDE11_DEPTH, mode=Mode.SUBTRACT)

    # Sketch22 → Cut-Extrude12 (cut)
    with BuildSketch(Plane(origin=(0, 20, 0), x_dir=(-1, 0, 0), z_dir=(0, 1, 0))):
        with Locations(Location((-10, 6.5, 0), (0, 0, 90))):
            Circle(SKETCH22_R)
        with Locations(Location((10, 6.5, 0), (0, 0, 270))):
            Circle(SKETCH22_R)
    cut_extrude12 = extrude(amount=-CUT_EXTRUDE12_DEPTH, mode=Mode.SUBTRACT)

    # CirPattern5: Cut-Extrude12 ×4 about axis
    cirpattern5_axis = Axis((0, 0, 0), (0, 0, 1))
    for i in range(1, CIRPATTERN5_COUNT):
        add(cut_extrude12.rotate(cirpattern5_axis, i * 360 / CIRPATTERN5_COUNT), mode=Mode.SUBTRACT)


solid = part.part
